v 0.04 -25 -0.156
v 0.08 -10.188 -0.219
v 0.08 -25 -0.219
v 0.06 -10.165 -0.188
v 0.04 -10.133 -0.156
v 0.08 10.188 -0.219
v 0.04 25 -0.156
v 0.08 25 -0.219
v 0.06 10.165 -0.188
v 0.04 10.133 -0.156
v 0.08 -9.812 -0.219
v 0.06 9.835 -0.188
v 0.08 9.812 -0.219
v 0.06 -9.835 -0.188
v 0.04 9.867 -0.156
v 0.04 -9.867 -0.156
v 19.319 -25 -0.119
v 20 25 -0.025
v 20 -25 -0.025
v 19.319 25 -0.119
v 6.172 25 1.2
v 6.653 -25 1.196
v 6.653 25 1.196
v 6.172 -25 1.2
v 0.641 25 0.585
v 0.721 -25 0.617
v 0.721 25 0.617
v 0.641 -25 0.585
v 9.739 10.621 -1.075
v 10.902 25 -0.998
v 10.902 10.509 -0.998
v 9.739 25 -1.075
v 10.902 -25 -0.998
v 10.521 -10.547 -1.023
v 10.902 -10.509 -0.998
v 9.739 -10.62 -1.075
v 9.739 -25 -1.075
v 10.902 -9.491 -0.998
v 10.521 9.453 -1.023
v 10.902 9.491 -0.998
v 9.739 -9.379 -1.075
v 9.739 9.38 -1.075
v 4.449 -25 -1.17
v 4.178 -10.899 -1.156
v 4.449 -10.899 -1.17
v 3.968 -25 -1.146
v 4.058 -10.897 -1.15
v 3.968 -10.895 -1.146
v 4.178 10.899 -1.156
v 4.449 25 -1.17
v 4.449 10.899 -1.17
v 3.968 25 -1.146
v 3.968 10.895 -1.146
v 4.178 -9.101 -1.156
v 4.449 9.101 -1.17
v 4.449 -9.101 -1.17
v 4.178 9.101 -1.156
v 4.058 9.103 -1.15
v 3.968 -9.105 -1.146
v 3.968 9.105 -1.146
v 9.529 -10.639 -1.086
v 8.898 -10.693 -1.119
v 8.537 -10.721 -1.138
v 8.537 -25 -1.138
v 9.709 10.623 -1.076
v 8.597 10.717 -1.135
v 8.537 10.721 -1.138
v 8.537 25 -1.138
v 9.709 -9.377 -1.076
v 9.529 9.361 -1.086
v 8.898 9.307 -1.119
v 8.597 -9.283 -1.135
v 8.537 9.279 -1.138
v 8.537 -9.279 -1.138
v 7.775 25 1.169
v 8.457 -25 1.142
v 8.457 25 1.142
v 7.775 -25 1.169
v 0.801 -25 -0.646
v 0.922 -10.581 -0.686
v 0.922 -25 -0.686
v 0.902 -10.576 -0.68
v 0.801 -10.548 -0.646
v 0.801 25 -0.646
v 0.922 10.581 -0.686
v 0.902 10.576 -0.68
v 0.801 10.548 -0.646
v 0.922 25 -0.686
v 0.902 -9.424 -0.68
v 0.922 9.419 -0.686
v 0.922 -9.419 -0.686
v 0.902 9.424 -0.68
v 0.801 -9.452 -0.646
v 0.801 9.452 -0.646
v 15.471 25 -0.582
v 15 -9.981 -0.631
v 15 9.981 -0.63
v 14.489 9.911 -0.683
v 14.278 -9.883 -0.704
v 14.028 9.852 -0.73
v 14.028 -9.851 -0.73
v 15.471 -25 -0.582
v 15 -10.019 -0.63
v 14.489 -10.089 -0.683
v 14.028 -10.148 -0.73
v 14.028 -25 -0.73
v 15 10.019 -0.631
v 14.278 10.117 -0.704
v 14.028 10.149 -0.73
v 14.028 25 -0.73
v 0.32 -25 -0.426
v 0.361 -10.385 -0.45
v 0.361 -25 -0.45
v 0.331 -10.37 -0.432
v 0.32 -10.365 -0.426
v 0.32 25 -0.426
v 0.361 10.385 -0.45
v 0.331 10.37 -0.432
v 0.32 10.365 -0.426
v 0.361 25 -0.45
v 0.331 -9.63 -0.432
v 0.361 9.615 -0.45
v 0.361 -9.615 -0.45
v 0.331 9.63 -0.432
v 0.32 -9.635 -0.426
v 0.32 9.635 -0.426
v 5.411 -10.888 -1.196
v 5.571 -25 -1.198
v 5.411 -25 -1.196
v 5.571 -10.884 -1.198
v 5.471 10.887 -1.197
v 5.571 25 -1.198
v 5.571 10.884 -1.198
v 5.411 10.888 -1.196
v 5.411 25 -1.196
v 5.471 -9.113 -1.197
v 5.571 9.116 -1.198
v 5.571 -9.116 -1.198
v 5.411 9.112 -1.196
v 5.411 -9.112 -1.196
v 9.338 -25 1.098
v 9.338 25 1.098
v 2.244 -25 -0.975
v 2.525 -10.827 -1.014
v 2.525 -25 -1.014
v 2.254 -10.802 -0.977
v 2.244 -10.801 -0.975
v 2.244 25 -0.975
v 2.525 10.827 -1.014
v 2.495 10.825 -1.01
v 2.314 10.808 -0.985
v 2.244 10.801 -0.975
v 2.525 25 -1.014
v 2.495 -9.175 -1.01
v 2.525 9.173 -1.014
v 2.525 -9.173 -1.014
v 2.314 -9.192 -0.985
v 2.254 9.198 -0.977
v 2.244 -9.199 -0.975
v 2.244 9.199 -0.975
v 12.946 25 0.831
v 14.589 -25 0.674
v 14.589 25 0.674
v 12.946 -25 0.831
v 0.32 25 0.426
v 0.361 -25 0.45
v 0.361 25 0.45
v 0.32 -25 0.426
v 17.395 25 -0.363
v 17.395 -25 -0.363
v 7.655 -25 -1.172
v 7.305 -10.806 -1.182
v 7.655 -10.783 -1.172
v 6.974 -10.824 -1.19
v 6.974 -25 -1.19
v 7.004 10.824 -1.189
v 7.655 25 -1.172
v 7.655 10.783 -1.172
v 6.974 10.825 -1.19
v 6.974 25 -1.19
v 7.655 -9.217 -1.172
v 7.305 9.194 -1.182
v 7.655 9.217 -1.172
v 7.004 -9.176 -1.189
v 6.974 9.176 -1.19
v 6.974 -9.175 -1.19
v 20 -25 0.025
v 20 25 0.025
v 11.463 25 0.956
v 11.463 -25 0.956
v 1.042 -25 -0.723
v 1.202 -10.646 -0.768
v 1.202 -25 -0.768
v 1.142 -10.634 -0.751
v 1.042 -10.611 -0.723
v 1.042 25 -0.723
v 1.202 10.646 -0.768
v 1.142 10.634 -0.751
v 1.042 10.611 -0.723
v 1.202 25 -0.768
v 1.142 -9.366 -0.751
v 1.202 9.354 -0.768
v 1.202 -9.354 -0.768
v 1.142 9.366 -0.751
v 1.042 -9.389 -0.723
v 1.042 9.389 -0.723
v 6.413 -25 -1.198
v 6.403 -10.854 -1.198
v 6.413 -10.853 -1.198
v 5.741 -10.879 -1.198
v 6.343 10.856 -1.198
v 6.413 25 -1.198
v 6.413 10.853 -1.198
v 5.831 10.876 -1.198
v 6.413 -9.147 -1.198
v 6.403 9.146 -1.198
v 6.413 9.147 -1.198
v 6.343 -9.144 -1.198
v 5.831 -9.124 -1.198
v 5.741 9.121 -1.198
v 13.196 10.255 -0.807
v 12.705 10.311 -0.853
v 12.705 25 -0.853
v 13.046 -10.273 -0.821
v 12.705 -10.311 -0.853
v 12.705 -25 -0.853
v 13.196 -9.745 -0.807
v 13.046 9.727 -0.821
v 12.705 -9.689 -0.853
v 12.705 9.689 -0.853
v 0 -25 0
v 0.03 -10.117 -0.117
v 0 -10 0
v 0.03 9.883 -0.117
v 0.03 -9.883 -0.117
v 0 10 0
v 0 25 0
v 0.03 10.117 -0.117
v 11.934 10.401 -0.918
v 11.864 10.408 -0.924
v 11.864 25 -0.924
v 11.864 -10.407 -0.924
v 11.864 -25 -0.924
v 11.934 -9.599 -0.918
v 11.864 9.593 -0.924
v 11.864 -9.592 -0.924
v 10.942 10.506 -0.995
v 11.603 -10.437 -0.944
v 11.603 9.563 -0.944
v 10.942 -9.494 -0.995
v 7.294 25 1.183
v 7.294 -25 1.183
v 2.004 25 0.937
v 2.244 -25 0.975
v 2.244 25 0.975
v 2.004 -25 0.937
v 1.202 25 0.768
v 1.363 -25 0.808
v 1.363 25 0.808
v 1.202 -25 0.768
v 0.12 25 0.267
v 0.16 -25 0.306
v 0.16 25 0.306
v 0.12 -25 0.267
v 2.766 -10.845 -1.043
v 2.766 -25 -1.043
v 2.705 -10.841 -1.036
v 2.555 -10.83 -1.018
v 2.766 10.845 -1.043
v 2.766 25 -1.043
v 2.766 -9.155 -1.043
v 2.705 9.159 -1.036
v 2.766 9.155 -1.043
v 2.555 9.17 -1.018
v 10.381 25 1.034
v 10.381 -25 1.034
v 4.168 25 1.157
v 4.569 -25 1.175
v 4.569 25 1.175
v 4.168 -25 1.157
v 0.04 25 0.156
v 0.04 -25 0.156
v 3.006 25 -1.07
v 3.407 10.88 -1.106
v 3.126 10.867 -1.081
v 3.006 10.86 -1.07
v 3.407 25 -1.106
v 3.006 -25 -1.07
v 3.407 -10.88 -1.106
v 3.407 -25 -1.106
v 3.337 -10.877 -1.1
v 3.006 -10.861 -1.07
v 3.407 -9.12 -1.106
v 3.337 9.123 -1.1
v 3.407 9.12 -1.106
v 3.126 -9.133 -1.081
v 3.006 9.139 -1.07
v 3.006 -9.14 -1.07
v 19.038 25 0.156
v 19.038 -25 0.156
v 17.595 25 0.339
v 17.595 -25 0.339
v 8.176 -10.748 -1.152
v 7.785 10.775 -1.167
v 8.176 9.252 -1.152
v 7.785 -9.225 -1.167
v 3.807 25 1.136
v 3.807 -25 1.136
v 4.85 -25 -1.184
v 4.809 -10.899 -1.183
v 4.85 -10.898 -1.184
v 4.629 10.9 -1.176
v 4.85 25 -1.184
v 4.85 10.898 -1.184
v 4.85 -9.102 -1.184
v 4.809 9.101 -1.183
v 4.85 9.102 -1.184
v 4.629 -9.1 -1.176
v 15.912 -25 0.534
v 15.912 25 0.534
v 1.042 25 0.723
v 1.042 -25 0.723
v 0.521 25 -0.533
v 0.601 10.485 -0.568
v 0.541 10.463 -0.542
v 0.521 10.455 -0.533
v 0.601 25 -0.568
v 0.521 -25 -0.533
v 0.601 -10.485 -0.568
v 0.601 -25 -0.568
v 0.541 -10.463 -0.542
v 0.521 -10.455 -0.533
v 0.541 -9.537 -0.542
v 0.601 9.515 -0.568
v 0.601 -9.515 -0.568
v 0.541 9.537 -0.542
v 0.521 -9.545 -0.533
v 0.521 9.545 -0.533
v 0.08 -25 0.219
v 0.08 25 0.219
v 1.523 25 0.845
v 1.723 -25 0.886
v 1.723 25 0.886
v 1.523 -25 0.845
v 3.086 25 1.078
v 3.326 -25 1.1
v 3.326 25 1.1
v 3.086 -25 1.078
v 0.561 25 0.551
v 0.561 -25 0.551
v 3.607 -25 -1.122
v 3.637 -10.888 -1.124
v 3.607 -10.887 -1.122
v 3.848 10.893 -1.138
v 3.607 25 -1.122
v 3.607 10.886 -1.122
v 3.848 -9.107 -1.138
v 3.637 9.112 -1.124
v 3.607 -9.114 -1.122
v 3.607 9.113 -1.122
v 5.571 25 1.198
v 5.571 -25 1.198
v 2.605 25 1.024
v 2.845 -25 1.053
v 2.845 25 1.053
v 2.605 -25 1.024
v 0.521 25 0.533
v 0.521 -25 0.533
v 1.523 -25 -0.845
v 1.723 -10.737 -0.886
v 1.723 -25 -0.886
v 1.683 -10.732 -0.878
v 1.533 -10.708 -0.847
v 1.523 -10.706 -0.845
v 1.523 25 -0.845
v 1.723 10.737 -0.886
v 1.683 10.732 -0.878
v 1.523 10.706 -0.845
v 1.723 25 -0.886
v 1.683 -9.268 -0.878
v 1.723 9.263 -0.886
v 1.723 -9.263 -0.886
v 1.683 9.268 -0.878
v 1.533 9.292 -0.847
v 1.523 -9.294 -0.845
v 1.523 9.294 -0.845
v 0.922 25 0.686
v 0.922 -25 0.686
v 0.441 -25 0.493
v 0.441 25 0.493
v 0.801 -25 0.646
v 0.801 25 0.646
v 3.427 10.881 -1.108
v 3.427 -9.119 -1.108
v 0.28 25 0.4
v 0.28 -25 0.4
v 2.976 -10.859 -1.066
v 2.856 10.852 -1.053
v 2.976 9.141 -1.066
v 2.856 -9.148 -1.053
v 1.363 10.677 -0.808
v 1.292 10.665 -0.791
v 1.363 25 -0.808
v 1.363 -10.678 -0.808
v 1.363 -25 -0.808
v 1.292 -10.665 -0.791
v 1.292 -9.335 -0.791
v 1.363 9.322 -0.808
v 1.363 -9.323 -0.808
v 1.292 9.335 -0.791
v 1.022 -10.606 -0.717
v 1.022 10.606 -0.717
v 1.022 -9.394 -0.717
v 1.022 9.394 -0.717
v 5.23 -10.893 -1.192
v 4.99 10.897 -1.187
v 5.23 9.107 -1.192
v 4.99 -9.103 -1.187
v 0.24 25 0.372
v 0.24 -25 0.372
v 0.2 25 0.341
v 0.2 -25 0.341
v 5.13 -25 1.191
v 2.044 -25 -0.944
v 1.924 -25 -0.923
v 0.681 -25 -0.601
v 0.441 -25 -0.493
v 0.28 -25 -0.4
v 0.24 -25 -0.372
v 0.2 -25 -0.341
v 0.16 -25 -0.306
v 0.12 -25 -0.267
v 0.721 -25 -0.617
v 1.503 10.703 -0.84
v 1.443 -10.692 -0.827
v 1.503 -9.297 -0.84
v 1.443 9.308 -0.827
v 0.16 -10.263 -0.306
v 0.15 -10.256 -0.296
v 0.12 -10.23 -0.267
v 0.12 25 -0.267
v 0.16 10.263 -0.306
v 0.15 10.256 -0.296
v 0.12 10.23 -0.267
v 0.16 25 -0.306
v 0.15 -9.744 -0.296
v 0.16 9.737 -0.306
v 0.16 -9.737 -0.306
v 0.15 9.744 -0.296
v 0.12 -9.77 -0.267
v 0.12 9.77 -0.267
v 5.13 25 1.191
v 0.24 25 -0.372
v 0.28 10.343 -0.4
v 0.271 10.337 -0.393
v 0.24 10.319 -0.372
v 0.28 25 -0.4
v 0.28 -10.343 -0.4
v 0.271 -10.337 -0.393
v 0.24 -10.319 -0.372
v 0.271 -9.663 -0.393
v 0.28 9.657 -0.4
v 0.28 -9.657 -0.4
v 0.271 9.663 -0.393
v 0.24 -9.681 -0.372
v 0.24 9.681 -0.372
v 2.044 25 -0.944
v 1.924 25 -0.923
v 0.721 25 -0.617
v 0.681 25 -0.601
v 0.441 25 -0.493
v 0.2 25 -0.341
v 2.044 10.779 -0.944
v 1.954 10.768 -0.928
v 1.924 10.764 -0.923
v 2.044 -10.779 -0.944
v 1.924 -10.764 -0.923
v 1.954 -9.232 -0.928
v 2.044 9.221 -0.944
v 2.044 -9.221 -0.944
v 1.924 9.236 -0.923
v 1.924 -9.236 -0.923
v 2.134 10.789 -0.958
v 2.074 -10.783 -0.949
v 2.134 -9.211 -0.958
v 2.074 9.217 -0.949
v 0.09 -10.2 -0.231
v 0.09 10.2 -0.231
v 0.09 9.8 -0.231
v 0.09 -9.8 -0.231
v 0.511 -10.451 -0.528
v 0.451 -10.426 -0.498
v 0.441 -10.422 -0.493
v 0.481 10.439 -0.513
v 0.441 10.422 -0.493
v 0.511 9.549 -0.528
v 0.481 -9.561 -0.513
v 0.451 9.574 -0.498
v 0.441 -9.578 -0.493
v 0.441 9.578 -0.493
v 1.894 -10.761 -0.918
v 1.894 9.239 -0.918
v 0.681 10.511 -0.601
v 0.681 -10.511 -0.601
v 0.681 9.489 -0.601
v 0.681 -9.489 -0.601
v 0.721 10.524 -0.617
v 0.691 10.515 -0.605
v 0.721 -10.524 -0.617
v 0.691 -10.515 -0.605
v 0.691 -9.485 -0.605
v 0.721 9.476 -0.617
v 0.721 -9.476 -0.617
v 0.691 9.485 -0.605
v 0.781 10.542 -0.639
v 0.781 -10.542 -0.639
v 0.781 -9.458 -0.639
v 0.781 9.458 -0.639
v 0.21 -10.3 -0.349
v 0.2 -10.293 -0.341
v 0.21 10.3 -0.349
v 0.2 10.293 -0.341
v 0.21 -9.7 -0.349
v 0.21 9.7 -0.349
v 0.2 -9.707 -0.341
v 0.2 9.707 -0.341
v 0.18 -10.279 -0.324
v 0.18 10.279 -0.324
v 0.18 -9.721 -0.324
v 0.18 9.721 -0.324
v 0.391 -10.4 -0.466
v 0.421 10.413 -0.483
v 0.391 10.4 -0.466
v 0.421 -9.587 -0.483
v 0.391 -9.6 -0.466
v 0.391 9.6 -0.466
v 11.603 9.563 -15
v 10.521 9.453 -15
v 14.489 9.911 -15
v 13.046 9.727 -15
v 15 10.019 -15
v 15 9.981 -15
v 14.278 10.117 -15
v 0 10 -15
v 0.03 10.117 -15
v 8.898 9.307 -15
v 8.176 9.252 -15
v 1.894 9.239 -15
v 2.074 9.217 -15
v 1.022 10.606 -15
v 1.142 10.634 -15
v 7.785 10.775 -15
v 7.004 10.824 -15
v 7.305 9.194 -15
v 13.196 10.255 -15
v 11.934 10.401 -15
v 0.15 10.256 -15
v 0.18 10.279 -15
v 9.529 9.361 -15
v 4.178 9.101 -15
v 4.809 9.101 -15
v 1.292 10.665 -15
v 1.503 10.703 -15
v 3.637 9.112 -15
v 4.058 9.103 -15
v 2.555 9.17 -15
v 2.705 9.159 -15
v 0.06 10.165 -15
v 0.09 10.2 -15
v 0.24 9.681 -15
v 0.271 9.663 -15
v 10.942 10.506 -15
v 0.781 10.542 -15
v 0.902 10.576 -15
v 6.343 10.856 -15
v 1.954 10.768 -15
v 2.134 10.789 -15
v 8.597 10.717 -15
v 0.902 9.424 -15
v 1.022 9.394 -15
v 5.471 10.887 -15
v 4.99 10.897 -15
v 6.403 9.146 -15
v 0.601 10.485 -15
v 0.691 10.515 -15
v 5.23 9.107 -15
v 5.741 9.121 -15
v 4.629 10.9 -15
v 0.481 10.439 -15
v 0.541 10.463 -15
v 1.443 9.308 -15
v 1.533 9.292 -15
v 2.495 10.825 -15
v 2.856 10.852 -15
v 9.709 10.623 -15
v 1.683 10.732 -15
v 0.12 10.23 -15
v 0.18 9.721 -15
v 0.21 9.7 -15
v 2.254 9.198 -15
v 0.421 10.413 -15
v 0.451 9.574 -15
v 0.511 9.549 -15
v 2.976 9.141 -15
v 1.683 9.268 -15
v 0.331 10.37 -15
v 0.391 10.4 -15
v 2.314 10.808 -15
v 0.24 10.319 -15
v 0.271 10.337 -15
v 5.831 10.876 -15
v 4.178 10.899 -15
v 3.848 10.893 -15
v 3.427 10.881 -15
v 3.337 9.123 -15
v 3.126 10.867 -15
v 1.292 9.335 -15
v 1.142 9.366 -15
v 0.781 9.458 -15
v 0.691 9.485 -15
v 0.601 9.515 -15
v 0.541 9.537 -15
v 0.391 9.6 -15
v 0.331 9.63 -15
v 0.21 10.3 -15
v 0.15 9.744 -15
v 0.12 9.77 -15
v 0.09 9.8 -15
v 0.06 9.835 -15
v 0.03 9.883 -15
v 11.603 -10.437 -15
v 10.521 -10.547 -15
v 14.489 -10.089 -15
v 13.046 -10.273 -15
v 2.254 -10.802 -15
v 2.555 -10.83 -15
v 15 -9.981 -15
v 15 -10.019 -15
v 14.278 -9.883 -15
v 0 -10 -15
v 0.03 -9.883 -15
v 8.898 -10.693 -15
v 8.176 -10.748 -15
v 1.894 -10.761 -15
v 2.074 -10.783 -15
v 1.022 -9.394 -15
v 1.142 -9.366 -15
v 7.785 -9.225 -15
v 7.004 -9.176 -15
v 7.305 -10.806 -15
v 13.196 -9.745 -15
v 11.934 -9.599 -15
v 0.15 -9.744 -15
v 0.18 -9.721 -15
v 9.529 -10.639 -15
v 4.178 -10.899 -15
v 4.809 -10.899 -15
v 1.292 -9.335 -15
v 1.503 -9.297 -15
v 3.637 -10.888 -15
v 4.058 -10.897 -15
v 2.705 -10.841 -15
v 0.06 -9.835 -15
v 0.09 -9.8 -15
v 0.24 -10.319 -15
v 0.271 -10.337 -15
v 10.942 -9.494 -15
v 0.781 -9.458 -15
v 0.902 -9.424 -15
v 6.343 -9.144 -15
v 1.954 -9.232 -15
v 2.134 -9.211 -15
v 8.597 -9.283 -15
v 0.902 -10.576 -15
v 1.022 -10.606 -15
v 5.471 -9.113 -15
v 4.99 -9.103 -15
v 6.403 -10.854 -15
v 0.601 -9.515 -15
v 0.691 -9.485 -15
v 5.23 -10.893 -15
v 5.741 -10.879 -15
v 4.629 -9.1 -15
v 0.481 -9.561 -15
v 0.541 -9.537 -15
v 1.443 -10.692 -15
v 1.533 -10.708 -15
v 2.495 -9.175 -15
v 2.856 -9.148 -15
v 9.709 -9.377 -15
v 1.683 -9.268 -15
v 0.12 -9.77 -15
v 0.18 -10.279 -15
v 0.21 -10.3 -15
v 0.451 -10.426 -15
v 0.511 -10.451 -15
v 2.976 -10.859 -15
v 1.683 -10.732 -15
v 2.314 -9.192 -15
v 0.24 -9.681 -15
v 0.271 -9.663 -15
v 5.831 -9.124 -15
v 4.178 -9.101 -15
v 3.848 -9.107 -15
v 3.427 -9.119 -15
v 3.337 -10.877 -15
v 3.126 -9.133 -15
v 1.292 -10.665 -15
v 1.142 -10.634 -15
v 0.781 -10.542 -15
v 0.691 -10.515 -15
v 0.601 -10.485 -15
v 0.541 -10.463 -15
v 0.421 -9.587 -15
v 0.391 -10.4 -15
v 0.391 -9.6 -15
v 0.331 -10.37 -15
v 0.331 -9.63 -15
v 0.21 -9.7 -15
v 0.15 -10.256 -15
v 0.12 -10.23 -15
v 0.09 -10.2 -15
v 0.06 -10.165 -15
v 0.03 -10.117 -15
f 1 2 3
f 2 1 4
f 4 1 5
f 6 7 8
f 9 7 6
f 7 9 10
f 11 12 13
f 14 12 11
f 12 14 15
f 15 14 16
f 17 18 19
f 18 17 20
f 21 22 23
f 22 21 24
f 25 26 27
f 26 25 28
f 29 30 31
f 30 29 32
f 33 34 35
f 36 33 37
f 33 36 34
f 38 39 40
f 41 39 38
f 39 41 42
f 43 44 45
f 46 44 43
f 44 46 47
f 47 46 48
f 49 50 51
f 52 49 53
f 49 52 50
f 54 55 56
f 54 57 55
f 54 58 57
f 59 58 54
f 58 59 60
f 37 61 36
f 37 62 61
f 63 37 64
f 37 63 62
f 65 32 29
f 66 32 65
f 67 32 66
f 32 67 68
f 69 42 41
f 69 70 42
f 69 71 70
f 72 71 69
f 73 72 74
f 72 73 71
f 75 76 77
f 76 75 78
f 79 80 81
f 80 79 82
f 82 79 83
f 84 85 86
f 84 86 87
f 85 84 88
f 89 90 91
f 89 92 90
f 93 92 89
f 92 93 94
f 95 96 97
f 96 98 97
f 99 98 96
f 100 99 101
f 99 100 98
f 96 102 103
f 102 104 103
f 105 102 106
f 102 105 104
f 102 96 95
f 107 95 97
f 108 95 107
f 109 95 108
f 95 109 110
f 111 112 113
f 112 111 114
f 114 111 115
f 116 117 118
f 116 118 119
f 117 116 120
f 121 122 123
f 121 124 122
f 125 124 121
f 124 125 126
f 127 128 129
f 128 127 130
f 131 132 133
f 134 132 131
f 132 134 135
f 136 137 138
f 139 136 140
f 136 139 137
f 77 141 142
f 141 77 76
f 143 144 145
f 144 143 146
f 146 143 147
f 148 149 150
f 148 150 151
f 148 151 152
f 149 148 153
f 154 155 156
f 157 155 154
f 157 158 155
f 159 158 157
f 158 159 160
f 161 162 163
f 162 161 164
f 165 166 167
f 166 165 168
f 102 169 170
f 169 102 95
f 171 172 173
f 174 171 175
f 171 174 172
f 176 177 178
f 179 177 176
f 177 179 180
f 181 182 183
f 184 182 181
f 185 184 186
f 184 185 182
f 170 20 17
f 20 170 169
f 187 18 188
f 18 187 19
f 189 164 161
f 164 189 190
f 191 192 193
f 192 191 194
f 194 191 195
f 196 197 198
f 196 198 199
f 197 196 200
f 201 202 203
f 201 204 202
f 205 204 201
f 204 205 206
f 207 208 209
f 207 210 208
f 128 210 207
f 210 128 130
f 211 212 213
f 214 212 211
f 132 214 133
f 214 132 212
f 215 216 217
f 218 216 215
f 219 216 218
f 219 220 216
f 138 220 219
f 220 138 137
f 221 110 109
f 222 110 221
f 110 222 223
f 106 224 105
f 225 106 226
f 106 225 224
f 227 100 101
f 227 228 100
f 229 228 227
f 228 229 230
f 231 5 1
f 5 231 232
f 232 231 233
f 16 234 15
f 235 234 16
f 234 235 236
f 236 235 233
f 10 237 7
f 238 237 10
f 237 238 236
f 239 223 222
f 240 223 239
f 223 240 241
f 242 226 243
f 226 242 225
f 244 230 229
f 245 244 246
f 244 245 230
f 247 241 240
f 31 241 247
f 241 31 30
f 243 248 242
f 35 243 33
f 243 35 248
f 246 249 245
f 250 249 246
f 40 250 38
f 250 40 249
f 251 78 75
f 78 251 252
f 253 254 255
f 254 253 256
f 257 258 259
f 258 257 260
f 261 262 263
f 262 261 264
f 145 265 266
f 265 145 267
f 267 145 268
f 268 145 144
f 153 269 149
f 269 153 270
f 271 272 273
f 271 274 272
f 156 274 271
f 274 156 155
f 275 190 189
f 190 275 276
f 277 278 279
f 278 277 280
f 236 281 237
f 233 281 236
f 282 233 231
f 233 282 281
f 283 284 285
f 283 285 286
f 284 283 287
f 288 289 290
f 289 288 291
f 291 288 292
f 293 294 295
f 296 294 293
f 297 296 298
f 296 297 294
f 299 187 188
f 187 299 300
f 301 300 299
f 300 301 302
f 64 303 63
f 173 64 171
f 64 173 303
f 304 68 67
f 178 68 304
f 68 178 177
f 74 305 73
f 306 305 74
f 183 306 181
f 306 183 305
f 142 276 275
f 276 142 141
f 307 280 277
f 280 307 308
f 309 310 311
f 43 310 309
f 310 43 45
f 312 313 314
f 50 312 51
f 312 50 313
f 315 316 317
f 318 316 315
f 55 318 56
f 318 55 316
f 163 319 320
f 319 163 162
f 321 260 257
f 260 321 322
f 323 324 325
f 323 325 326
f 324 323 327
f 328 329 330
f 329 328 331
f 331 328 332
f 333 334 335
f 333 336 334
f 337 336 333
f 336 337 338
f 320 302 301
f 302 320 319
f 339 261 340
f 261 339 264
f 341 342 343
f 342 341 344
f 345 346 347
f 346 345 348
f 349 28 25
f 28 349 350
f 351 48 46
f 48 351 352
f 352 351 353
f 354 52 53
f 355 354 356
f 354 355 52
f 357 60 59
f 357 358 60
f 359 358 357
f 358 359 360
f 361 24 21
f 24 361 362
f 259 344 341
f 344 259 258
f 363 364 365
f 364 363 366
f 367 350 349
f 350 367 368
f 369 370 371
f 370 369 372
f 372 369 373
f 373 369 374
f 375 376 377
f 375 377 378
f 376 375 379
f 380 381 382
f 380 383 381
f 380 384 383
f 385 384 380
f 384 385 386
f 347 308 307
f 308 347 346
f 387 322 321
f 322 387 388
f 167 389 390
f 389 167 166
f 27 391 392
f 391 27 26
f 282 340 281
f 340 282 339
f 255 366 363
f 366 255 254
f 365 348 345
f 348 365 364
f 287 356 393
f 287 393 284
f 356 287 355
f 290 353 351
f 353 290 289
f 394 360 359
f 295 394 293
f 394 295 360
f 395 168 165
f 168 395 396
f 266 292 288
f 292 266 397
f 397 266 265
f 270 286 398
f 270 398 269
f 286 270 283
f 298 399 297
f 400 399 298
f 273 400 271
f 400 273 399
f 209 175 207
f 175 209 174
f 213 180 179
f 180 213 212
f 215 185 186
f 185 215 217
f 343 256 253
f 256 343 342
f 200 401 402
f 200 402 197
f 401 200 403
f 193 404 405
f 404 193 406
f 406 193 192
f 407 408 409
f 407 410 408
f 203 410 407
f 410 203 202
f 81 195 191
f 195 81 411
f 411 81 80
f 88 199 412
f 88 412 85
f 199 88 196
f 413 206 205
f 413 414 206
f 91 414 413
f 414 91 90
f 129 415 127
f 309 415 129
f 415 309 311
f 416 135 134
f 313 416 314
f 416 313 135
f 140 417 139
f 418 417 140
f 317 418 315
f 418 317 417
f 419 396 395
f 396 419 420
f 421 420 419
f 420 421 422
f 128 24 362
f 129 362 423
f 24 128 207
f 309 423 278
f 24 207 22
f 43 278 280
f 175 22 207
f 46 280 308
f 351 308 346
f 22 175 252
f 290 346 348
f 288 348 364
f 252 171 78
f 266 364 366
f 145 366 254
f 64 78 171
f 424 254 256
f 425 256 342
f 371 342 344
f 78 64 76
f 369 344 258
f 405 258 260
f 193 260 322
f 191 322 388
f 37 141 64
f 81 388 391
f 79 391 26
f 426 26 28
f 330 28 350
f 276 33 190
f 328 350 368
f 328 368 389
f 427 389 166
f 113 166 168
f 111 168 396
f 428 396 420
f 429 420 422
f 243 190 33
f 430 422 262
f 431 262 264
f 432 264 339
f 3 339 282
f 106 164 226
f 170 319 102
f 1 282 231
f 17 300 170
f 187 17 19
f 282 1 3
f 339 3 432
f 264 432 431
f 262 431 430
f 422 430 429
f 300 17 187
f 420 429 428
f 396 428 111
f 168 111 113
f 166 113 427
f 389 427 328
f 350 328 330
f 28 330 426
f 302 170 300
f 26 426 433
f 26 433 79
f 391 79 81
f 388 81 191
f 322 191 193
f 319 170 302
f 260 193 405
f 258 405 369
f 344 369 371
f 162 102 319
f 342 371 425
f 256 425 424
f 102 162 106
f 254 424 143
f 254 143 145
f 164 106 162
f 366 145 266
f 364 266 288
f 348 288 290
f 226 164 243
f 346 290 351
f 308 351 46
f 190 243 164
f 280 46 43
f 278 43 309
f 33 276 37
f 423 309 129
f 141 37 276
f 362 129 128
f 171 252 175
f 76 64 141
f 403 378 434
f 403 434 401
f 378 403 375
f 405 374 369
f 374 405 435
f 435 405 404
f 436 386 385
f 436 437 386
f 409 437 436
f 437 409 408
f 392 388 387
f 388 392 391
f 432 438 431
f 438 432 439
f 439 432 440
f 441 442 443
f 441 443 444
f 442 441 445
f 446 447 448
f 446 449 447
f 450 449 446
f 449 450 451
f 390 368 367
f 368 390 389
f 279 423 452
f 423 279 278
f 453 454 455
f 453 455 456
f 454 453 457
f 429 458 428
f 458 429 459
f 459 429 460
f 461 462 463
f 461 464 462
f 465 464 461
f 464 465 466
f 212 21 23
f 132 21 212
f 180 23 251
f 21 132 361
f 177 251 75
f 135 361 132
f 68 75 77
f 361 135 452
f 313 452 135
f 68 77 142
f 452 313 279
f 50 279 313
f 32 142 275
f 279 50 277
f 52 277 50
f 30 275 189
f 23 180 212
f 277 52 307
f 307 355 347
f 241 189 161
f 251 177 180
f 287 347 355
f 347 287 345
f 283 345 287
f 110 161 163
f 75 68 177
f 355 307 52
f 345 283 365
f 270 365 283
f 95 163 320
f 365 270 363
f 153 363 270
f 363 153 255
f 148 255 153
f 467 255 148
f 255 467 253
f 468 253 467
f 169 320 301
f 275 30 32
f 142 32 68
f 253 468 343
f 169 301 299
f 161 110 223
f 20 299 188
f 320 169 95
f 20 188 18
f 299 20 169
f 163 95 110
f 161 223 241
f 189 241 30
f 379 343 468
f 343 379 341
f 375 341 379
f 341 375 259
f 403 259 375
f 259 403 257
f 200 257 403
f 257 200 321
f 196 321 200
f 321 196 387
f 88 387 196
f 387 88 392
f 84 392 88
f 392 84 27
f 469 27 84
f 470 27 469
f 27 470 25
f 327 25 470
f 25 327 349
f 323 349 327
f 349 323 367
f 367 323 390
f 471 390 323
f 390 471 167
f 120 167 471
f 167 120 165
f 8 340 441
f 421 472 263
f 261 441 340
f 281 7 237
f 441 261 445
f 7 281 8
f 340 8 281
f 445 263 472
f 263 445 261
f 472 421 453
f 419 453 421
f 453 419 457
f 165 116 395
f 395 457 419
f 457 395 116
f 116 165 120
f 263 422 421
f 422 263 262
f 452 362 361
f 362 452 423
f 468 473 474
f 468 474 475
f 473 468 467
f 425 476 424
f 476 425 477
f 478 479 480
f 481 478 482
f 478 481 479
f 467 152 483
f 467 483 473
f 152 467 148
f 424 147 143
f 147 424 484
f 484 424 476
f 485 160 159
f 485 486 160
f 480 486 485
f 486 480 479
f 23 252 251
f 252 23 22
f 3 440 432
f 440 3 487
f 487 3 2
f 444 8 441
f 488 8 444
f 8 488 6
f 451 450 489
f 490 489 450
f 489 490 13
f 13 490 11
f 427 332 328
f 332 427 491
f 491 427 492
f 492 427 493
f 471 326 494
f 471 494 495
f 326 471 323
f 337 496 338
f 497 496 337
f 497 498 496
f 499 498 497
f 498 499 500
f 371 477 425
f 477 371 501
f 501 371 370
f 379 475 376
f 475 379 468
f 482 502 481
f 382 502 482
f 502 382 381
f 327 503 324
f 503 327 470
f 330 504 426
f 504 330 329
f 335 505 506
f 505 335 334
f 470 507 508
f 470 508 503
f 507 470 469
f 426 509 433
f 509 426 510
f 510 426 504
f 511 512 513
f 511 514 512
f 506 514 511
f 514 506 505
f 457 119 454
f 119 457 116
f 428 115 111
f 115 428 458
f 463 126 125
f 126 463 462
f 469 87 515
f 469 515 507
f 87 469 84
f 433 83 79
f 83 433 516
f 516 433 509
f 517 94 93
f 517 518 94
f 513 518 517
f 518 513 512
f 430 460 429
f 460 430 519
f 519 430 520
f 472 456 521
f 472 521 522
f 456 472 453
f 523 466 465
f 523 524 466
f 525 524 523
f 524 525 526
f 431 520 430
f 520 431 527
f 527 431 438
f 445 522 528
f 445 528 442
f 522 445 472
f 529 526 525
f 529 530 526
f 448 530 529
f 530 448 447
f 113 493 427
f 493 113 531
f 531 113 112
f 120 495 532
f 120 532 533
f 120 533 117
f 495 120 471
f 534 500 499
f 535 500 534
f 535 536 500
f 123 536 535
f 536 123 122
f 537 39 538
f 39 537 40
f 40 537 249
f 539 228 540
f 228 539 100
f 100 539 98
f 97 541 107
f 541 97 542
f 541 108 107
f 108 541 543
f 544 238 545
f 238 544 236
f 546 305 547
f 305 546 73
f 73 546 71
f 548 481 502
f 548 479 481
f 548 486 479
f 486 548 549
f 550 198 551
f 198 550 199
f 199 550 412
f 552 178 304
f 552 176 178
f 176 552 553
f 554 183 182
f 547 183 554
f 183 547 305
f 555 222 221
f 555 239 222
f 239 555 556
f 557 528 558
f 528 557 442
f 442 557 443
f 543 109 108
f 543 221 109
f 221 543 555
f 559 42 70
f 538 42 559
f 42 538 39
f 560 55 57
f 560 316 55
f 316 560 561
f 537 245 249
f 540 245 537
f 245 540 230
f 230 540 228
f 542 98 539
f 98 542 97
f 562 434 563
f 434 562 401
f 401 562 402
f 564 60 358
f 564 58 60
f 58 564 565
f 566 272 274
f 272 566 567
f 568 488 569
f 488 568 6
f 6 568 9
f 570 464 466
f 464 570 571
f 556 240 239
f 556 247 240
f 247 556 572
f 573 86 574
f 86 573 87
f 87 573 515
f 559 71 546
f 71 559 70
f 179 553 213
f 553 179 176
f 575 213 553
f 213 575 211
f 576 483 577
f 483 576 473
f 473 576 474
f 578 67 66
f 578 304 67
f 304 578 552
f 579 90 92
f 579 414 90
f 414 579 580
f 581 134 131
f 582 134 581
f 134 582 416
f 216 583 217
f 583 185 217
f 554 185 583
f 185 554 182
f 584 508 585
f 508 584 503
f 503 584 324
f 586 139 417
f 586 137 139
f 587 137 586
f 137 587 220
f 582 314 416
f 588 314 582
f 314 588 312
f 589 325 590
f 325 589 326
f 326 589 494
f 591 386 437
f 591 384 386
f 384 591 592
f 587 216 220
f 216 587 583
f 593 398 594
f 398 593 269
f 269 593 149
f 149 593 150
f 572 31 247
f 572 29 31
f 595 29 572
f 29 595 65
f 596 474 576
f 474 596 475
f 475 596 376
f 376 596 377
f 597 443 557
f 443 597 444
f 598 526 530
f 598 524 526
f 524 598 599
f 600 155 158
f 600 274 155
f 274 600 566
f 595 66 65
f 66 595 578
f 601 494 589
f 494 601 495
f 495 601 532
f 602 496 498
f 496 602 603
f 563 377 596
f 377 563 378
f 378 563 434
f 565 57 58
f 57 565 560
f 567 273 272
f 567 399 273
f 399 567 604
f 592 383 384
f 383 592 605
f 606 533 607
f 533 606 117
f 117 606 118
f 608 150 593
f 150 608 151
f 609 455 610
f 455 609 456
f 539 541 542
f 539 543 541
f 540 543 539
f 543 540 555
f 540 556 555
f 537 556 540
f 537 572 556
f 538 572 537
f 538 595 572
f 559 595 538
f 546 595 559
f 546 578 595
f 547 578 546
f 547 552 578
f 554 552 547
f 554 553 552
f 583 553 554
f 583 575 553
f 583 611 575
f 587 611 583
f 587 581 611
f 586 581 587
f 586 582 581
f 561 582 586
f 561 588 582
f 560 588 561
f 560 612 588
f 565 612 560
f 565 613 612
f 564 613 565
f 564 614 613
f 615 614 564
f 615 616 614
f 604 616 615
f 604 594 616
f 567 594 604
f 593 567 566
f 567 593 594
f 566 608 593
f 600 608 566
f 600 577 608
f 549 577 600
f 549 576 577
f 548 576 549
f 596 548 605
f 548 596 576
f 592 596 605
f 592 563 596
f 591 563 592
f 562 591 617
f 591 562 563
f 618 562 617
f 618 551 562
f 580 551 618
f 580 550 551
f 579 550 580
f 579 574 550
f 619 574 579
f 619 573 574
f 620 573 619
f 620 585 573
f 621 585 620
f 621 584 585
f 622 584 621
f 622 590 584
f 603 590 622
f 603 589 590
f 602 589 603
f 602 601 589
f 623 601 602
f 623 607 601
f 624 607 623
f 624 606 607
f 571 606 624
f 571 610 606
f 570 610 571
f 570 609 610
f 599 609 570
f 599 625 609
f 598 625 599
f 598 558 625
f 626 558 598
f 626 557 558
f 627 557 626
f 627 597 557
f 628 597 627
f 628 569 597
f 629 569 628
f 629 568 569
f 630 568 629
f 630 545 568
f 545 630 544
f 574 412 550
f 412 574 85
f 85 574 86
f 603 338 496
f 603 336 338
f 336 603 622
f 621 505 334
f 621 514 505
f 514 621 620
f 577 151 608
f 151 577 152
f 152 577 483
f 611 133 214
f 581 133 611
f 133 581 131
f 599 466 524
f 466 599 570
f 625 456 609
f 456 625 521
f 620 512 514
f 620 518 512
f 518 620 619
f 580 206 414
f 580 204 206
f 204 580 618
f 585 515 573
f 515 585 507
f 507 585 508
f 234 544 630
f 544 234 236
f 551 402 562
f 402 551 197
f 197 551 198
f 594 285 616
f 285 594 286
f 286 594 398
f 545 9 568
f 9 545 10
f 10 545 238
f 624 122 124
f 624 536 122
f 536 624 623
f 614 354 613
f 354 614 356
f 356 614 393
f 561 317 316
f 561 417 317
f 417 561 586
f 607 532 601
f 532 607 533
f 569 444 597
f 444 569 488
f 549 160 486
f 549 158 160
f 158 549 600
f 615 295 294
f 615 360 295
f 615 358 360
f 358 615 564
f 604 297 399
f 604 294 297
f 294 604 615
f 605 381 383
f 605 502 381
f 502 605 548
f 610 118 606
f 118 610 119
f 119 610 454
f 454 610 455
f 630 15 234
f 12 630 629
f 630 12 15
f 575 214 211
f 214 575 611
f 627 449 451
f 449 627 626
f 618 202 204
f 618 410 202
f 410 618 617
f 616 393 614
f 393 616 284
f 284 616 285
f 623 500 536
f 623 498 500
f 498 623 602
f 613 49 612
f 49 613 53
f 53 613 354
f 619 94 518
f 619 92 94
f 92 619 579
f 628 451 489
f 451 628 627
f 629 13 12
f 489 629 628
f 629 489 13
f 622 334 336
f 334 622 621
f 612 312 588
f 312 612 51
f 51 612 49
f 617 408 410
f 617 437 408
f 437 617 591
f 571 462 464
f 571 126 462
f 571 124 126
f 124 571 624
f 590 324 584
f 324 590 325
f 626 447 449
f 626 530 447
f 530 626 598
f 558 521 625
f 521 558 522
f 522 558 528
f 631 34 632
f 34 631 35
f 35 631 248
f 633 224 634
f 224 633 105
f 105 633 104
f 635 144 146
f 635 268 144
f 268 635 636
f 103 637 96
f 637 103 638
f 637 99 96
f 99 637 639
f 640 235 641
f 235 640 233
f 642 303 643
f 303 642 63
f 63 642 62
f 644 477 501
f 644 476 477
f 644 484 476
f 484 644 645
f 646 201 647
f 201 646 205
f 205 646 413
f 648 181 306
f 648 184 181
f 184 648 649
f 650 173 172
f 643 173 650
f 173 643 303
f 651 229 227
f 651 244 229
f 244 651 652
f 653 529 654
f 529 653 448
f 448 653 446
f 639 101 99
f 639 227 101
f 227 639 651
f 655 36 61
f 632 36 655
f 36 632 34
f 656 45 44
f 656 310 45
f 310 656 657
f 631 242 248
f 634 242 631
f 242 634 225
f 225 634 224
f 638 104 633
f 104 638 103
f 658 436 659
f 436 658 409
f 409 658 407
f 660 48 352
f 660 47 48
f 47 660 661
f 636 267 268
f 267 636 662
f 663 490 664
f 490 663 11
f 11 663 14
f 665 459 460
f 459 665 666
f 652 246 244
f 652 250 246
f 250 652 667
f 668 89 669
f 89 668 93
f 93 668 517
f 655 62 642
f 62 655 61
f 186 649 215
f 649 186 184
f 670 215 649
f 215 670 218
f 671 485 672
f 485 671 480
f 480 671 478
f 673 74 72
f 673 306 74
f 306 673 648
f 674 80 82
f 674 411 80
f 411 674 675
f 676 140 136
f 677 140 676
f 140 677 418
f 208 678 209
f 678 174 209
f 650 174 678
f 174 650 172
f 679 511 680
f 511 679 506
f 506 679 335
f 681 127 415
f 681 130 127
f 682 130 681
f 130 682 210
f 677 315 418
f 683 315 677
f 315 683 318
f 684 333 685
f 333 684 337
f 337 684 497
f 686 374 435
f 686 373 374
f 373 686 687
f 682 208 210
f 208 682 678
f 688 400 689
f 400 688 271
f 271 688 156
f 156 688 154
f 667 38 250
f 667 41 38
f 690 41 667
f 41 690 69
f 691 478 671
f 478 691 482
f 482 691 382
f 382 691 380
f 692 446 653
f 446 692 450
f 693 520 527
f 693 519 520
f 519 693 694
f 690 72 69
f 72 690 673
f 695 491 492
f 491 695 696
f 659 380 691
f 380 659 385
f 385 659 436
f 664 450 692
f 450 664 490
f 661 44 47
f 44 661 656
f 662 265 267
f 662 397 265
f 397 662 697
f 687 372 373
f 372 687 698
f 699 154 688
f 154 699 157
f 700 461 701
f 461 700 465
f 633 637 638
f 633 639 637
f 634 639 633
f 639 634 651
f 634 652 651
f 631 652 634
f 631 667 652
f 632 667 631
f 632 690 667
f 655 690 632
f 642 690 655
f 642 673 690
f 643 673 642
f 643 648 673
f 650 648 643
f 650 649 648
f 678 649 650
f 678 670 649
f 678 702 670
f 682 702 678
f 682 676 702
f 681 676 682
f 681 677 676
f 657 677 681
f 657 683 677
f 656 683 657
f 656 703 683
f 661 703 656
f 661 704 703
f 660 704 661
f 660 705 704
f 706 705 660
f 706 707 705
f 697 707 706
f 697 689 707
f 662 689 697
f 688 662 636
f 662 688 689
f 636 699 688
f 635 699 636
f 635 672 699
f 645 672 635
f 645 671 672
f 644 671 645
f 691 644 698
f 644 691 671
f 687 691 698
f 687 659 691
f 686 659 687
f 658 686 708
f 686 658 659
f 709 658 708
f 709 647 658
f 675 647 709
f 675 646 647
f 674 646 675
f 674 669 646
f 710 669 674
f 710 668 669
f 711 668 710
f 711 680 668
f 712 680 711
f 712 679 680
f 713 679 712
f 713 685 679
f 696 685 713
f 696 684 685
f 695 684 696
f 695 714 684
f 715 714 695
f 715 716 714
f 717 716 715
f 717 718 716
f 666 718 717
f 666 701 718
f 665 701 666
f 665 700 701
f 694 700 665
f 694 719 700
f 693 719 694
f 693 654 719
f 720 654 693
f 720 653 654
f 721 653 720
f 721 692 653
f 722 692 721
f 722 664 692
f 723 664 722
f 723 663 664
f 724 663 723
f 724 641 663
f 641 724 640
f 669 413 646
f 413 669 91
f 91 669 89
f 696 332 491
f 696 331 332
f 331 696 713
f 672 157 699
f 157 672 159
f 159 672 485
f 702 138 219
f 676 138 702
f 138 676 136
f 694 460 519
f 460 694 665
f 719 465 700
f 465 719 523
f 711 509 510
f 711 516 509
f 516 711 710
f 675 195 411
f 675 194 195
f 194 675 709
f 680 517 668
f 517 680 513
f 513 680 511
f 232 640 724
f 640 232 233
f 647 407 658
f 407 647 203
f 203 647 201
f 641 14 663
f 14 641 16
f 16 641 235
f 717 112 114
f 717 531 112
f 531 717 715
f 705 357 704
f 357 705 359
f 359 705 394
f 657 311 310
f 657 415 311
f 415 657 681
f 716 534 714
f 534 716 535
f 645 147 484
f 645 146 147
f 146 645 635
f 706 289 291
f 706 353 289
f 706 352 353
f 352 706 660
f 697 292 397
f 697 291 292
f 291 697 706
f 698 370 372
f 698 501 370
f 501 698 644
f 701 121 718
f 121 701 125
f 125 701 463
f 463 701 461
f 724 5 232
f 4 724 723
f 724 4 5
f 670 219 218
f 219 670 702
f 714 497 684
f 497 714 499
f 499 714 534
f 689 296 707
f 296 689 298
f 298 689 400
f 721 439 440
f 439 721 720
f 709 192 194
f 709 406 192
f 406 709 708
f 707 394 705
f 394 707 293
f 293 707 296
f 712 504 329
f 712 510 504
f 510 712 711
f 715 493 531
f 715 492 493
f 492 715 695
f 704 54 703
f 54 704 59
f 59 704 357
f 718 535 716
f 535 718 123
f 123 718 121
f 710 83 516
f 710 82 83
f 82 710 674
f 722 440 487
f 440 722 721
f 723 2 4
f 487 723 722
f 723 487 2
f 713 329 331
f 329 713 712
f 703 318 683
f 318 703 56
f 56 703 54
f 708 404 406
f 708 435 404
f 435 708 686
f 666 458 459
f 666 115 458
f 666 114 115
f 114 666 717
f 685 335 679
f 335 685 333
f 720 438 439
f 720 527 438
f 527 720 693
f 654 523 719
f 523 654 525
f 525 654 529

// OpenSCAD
function naca_half_thickness(x,t) = 5*t*(0.2969*sqrt(x) - 0.1260*x - 0.3516*pow(x,2) + 0.2843*pow(x,3) - 0.1015*pow(x,4));
function naca_top_coordinates(t,n) = [ for (x=[0:1/(n-1):1]) [x, naca_half_thickness(x,t)]];
function naca_bottom_coordinates(t,n) = [ for (x=[1:-1/(n-1):0]) [x, - naca_half_thickness(x,t)]];
function naca_coordinates(t,n) = concat(naca_top_coordinates(t,n), naca_bottom_coordinates(t,n));
module naca_airfoil(chord,t,n) {
    points = naca_coordinates(t,n);
    scale([chord,chord,1])
        polygon(points);
}
module naca_wing(span,chord,t,n,center=false) {
    linear_extrude(height=span,center=center) {
        naca_airfoil(chord,t,n);
    }
}

rotate([90,0,0])
    naca_wing(span=50,chord=20,t=0.12,n=500,center=true);
translate([0,10,-15])
    naca_wing(span=15,chord=15,t=0.12,n=500);
translate([0,-10,-15])
    naca_wing(span=15,chord=15,t=0.12,n=500);
